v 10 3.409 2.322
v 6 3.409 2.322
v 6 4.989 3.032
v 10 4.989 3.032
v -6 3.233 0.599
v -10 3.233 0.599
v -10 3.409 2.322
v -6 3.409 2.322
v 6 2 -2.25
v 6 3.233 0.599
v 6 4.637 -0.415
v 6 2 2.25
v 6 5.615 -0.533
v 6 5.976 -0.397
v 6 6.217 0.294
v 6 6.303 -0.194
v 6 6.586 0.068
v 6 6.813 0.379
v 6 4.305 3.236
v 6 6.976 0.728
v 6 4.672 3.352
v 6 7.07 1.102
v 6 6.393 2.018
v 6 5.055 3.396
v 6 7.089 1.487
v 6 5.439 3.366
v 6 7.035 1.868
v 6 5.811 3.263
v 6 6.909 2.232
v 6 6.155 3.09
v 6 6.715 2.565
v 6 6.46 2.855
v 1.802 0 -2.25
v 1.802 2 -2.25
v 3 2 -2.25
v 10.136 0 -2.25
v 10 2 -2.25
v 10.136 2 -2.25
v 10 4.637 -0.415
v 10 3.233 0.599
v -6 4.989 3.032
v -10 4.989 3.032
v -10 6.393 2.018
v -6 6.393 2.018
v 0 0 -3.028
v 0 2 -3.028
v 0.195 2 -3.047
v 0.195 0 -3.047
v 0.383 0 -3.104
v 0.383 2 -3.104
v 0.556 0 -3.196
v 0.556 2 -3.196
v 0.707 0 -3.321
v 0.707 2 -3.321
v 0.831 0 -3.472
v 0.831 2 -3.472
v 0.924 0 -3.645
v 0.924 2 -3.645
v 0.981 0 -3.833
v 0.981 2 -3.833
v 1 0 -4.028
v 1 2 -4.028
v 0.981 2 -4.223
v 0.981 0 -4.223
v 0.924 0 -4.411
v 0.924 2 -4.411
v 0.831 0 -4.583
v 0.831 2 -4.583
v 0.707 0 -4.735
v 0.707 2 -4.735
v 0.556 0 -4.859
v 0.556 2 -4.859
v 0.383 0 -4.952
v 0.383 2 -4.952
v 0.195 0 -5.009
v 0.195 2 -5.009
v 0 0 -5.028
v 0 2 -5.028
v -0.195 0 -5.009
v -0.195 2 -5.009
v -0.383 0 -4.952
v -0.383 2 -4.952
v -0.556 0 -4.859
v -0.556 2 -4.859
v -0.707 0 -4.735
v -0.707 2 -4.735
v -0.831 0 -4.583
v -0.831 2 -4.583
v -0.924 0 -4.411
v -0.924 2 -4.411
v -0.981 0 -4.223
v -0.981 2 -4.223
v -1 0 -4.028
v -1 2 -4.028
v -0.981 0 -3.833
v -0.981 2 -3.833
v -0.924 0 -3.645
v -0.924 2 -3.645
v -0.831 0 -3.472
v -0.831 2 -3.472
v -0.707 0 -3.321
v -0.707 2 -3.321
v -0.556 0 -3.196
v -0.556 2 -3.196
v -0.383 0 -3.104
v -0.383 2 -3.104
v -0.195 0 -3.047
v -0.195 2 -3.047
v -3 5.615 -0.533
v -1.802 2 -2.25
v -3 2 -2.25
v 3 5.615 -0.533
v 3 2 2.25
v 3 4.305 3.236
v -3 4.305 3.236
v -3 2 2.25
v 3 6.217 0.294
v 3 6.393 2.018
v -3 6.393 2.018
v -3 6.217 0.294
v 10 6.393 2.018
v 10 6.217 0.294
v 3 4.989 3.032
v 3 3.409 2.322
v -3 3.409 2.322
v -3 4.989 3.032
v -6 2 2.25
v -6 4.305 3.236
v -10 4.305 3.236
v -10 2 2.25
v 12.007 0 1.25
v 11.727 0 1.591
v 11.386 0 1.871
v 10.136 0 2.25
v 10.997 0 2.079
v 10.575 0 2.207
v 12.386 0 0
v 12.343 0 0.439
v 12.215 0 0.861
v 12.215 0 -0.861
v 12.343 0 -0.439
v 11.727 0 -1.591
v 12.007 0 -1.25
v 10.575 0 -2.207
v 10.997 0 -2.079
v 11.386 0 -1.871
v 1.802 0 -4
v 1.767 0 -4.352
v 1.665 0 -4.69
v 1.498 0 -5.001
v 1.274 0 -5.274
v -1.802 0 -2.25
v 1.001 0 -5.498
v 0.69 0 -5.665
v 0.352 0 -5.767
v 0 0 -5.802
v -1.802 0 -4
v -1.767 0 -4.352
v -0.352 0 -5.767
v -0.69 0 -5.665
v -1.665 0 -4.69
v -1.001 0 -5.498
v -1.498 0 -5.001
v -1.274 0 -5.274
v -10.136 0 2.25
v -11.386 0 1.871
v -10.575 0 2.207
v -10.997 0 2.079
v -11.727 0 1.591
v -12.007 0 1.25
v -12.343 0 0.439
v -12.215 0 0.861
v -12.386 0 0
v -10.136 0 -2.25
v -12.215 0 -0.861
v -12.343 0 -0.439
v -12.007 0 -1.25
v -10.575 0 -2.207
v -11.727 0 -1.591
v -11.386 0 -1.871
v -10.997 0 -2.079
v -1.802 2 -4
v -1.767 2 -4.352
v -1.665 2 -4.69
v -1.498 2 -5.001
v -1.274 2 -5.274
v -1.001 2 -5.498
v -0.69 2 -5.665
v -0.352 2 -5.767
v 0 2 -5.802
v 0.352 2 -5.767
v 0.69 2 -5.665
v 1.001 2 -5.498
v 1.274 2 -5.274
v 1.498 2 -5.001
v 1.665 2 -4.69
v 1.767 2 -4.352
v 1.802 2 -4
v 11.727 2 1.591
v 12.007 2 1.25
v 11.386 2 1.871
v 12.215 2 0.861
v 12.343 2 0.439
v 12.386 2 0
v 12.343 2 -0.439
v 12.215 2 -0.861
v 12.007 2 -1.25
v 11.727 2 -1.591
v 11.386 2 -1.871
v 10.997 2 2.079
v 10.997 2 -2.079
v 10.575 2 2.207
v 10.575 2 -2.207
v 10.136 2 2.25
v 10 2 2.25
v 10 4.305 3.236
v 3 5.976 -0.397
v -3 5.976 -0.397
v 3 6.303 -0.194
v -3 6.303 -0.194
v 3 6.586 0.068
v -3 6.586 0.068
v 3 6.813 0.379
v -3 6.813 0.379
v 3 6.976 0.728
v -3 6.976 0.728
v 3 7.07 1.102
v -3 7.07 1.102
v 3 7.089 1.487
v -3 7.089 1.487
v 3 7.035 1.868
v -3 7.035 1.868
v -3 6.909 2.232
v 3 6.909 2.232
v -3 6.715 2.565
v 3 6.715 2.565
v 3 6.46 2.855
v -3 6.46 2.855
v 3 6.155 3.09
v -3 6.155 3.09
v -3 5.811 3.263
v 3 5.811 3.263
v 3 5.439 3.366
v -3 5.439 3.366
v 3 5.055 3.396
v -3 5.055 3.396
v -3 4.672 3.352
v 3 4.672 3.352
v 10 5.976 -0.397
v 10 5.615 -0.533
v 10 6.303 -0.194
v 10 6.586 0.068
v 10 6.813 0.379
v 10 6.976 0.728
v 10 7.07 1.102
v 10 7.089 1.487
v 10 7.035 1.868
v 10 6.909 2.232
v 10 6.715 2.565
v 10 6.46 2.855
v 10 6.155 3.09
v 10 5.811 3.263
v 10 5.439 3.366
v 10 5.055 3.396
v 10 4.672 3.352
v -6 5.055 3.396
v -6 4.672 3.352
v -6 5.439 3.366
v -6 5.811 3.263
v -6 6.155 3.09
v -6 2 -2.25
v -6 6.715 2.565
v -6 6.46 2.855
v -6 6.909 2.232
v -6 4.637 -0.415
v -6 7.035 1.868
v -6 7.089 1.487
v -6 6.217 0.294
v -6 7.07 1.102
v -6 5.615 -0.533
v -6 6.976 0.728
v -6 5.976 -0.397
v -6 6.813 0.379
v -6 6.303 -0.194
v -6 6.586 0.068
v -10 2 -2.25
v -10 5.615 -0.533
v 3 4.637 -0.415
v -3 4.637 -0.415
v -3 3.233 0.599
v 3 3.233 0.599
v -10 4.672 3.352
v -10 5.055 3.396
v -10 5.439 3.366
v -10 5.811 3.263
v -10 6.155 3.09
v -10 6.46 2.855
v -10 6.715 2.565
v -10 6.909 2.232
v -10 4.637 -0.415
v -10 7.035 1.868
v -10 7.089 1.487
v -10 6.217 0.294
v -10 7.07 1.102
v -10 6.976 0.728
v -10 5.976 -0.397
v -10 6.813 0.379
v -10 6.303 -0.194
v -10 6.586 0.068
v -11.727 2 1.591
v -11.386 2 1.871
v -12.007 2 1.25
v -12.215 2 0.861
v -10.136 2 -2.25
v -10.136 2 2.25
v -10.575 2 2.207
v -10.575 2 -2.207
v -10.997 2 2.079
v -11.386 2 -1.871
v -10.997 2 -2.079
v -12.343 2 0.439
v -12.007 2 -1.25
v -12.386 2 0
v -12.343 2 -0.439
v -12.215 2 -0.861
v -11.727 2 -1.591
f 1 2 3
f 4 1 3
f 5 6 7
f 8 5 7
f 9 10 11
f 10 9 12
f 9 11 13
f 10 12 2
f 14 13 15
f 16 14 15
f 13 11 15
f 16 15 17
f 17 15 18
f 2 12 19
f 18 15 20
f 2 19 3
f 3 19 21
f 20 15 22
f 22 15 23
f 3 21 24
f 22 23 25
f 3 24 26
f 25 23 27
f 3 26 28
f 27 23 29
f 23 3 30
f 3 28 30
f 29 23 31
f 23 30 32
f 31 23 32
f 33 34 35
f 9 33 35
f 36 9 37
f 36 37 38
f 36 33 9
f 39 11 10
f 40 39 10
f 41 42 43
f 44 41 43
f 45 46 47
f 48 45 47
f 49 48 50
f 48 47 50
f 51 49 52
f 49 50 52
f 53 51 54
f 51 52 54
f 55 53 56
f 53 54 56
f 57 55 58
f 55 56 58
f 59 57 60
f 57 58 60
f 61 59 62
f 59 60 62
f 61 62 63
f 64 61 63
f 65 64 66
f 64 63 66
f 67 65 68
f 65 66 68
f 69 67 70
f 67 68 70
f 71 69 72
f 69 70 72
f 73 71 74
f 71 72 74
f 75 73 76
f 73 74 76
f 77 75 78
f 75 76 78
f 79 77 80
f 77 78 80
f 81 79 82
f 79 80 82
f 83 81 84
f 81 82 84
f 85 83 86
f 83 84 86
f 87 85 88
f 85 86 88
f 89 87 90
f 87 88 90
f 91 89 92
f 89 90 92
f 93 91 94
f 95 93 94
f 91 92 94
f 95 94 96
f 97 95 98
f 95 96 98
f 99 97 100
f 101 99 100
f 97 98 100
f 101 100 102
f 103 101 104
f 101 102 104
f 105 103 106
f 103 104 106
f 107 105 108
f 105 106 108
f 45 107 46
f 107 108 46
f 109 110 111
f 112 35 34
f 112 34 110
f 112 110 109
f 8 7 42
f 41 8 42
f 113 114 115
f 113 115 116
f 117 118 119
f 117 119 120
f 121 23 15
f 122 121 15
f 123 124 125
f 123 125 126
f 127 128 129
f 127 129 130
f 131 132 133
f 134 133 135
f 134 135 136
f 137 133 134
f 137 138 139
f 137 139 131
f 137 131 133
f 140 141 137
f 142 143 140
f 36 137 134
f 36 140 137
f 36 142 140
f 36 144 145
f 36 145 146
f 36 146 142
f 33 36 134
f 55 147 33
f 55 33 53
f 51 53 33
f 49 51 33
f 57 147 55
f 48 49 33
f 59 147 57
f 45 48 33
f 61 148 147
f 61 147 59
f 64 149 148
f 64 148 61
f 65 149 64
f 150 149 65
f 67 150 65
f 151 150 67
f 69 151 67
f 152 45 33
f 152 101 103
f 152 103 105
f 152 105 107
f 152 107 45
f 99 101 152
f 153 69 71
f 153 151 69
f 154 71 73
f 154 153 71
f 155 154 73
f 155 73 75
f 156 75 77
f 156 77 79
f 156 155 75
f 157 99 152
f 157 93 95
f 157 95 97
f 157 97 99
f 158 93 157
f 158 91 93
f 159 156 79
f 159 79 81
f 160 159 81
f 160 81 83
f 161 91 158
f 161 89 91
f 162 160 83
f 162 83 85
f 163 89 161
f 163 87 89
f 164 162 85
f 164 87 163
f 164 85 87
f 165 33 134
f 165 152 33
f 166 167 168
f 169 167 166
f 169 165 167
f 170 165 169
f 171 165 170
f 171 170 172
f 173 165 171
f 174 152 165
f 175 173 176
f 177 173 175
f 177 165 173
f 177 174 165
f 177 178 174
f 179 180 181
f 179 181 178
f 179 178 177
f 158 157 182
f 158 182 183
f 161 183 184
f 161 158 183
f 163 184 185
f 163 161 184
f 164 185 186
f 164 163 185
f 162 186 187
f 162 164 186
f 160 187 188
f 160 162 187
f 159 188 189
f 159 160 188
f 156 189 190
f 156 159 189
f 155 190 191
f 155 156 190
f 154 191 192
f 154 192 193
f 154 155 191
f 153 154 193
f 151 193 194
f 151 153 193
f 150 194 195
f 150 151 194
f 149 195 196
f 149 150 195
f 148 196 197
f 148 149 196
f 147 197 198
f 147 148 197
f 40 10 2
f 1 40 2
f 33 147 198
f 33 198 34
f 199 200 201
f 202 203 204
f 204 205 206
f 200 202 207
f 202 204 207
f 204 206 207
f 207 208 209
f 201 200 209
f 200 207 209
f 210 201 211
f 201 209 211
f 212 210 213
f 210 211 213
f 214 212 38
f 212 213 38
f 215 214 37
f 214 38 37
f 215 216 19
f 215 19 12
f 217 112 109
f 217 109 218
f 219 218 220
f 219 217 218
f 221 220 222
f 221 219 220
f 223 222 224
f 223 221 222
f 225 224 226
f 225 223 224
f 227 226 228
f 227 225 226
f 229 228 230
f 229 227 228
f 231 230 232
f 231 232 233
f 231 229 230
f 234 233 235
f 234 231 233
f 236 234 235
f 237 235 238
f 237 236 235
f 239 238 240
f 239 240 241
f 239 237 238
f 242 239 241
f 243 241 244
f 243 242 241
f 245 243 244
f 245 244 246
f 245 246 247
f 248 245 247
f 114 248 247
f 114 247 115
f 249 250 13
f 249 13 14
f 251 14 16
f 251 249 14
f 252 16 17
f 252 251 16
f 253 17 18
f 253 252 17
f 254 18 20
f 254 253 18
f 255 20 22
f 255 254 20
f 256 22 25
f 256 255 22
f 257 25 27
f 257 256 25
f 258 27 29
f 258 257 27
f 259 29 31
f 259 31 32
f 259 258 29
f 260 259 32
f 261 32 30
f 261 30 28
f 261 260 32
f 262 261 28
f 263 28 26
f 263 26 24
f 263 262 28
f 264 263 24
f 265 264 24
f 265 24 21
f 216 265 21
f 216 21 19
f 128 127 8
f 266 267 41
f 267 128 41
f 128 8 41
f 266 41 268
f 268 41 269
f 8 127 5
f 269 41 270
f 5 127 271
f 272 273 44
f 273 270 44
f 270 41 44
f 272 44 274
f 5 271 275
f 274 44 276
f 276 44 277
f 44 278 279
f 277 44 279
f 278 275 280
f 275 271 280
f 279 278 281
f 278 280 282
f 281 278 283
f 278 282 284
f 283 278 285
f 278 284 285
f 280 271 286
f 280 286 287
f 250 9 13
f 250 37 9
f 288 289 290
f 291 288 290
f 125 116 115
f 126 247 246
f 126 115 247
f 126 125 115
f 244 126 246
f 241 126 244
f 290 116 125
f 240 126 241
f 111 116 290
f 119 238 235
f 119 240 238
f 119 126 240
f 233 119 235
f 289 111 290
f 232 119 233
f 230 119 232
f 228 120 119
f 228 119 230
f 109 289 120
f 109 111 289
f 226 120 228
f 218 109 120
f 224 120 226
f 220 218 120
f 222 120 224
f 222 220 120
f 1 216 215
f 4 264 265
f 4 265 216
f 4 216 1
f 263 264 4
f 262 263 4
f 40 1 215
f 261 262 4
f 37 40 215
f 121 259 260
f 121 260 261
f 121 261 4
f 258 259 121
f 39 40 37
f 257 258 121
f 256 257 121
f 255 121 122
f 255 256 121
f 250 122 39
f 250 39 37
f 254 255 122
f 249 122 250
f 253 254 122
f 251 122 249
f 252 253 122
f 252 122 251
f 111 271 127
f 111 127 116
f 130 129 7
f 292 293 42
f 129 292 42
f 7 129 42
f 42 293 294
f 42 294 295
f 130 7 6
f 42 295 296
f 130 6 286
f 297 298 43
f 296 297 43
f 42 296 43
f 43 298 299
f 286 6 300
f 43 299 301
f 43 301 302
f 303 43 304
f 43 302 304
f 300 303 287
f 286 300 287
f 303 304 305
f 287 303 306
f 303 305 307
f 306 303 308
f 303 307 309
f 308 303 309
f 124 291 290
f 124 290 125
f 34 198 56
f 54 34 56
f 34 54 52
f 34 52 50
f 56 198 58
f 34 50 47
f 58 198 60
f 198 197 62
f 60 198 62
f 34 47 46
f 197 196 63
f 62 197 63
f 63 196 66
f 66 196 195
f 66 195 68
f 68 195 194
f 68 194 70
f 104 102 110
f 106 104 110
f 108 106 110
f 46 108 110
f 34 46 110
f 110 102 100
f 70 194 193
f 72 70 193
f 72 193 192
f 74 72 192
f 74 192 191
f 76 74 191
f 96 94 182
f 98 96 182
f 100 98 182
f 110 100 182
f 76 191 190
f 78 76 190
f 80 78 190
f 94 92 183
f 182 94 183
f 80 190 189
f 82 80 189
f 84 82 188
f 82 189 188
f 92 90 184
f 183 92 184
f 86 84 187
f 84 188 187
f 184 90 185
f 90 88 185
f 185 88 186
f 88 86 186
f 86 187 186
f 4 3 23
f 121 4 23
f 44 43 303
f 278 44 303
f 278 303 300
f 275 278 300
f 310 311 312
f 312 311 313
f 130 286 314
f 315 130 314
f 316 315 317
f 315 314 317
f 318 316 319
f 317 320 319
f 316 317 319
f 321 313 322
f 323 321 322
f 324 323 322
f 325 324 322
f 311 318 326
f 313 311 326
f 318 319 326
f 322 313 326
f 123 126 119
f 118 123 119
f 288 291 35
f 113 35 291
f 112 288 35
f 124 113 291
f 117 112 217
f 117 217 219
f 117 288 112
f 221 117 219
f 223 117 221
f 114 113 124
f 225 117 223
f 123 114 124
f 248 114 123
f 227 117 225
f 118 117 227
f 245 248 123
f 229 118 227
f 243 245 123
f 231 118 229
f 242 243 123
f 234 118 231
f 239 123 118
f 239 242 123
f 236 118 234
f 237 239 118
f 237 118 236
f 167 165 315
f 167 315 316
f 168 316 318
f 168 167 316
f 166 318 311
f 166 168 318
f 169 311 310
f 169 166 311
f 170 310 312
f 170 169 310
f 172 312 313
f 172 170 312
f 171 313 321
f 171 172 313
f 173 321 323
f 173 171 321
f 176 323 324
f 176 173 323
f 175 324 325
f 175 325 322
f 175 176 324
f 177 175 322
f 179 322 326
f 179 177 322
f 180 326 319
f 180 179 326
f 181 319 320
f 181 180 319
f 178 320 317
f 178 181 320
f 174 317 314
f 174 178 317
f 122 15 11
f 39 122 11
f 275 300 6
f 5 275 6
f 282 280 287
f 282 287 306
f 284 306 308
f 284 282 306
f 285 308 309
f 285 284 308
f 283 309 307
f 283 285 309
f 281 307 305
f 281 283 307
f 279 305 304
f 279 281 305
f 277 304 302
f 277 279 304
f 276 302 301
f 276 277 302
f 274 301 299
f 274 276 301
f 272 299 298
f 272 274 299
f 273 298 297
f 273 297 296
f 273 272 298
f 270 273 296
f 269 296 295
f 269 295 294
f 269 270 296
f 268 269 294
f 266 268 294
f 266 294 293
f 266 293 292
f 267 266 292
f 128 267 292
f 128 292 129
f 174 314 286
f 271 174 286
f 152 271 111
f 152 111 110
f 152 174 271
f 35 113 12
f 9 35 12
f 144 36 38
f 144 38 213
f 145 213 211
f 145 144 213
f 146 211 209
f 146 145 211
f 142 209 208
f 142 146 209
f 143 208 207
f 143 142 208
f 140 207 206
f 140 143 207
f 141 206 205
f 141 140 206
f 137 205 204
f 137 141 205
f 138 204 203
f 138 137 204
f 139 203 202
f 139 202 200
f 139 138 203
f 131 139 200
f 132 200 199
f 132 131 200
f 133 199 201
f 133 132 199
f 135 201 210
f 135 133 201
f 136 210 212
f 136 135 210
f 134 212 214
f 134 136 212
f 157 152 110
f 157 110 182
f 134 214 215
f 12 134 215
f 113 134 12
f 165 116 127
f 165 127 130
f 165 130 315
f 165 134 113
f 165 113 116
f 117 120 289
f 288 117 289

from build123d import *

# Parameters (mm, degrees)
EXTRUDE_1_DEPTH     = 2
SKETCH_3_R          = 1
CUT_EXTRUDE_1_DEPTH = 2
EXTRUDE_2_DEPTH     = 10
CUT_EXTRUDE_2_DEPTH = 20
SKETCH_9_W          = 3
SKETCH_9_H          = 8.464174718
CUT_EXTRUDE_3_DEPTH = 10


with BuildPart() as part:
    # 草图2 → 凸台-拉伸1 (new body)
    with BuildSketch(Plane(origin=(0, 0, 0), x_dir=(1, 0, 0), z_dir=(0, 1, 0))):
        with BuildLine():
            Line((-10.13605196, 2.25), (-1.801845215, 2.25))
            Line((-1.801845215, 2.25), (-1.801845215, 4))
            ThreePointArc((-1.801845215, 4), (0, 5.801845215), (1.801845215, 4))
            Line((1.801845215, 4), (1.801845215, 2.25))
            Line((1.801845215, 2.25), (10.13605196, 2.25))
            ThreePointArc((10.13605196, 2.25), (12.38605196, 0), (10.13605196, -2.25))
            Line((10.13605196, -2.25), (-10.13605196, -2.25))
            ThreePointArc((-10.13605196, -2.25), (-12.38605196, 0), (-10.13605196, 2.25))
        make_face()
    extrude(amount=EXTRUDE_1_DEPTH)

    # 草图3 → 切除-拉伸1 (cut)
    with BuildSketch(Plane(origin=(0, 2, 0), x_dir=(1, 0, 0), z_dir=(0, 1, 0))):
        with Locations(Location((0, 4.027870037, 0), (0, 0, 270))):
            Circle(SKETCH_3_R)
    extrude(amount=-CUT_EXTRUDE_1_DEPTH, mode=Mode.SUBTRACT)

    # 草图4 → 凸台-拉伸2 (add, symmetric)
    with BuildSketch(Plane(origin=(0, 0, 0), x_dir=(0, 0, -1), z_dir=(1, 0, 0))):
        with BuildLine():
            Line((2.25, 2), (0.533443954, 5.615166387))
            ThreePointArc((0.533443954, 5.615166387), (-2.053385242, 6.980617435), (-3.235702378, 4.305123453))
            Line((-3.235702378, 4.305123453), (-2.25, 2))
            Line((-2.25, 2), (2.25, 2))
        make_face()
    extrude(amount=EXTRUDE_2_DEPTH, both=True)

    # 草图8 → 切除-拉伸2 (cut)
    with BuildSketch(Plane.ZY.offset(10)):
        Polygon((0.599367488, 3.232629101), (2.322446911, 3.408689608), (3.031513751, 4.988950414), (2.017501168, 6.393150714), (0.294421745, 6.217090207), (-0.414645095, 4.6368294), align=None)
    extrude(amount=-CUT_EXTRUDE_2_DEPTH, mode=Mode.SUBTRACT)

    # 草图9 → 切除-拉伸3 (cut, symmetric)
    with BuildSketch(Plane.XY):
        with Locations((-4.5, 6.232087359)):
            Rectangle(SKETCH_9_W, SKETCH_9_H)
        with Locations((4.5, 6.232087359)):
            Rectangle(SKETCH_9_W, SKETCH_9_H)
    extrude(amount=CUT_EXTRUDE_3_DEPTH, both=True, mode=Mode.SUBTRACT)


solid = part.part
